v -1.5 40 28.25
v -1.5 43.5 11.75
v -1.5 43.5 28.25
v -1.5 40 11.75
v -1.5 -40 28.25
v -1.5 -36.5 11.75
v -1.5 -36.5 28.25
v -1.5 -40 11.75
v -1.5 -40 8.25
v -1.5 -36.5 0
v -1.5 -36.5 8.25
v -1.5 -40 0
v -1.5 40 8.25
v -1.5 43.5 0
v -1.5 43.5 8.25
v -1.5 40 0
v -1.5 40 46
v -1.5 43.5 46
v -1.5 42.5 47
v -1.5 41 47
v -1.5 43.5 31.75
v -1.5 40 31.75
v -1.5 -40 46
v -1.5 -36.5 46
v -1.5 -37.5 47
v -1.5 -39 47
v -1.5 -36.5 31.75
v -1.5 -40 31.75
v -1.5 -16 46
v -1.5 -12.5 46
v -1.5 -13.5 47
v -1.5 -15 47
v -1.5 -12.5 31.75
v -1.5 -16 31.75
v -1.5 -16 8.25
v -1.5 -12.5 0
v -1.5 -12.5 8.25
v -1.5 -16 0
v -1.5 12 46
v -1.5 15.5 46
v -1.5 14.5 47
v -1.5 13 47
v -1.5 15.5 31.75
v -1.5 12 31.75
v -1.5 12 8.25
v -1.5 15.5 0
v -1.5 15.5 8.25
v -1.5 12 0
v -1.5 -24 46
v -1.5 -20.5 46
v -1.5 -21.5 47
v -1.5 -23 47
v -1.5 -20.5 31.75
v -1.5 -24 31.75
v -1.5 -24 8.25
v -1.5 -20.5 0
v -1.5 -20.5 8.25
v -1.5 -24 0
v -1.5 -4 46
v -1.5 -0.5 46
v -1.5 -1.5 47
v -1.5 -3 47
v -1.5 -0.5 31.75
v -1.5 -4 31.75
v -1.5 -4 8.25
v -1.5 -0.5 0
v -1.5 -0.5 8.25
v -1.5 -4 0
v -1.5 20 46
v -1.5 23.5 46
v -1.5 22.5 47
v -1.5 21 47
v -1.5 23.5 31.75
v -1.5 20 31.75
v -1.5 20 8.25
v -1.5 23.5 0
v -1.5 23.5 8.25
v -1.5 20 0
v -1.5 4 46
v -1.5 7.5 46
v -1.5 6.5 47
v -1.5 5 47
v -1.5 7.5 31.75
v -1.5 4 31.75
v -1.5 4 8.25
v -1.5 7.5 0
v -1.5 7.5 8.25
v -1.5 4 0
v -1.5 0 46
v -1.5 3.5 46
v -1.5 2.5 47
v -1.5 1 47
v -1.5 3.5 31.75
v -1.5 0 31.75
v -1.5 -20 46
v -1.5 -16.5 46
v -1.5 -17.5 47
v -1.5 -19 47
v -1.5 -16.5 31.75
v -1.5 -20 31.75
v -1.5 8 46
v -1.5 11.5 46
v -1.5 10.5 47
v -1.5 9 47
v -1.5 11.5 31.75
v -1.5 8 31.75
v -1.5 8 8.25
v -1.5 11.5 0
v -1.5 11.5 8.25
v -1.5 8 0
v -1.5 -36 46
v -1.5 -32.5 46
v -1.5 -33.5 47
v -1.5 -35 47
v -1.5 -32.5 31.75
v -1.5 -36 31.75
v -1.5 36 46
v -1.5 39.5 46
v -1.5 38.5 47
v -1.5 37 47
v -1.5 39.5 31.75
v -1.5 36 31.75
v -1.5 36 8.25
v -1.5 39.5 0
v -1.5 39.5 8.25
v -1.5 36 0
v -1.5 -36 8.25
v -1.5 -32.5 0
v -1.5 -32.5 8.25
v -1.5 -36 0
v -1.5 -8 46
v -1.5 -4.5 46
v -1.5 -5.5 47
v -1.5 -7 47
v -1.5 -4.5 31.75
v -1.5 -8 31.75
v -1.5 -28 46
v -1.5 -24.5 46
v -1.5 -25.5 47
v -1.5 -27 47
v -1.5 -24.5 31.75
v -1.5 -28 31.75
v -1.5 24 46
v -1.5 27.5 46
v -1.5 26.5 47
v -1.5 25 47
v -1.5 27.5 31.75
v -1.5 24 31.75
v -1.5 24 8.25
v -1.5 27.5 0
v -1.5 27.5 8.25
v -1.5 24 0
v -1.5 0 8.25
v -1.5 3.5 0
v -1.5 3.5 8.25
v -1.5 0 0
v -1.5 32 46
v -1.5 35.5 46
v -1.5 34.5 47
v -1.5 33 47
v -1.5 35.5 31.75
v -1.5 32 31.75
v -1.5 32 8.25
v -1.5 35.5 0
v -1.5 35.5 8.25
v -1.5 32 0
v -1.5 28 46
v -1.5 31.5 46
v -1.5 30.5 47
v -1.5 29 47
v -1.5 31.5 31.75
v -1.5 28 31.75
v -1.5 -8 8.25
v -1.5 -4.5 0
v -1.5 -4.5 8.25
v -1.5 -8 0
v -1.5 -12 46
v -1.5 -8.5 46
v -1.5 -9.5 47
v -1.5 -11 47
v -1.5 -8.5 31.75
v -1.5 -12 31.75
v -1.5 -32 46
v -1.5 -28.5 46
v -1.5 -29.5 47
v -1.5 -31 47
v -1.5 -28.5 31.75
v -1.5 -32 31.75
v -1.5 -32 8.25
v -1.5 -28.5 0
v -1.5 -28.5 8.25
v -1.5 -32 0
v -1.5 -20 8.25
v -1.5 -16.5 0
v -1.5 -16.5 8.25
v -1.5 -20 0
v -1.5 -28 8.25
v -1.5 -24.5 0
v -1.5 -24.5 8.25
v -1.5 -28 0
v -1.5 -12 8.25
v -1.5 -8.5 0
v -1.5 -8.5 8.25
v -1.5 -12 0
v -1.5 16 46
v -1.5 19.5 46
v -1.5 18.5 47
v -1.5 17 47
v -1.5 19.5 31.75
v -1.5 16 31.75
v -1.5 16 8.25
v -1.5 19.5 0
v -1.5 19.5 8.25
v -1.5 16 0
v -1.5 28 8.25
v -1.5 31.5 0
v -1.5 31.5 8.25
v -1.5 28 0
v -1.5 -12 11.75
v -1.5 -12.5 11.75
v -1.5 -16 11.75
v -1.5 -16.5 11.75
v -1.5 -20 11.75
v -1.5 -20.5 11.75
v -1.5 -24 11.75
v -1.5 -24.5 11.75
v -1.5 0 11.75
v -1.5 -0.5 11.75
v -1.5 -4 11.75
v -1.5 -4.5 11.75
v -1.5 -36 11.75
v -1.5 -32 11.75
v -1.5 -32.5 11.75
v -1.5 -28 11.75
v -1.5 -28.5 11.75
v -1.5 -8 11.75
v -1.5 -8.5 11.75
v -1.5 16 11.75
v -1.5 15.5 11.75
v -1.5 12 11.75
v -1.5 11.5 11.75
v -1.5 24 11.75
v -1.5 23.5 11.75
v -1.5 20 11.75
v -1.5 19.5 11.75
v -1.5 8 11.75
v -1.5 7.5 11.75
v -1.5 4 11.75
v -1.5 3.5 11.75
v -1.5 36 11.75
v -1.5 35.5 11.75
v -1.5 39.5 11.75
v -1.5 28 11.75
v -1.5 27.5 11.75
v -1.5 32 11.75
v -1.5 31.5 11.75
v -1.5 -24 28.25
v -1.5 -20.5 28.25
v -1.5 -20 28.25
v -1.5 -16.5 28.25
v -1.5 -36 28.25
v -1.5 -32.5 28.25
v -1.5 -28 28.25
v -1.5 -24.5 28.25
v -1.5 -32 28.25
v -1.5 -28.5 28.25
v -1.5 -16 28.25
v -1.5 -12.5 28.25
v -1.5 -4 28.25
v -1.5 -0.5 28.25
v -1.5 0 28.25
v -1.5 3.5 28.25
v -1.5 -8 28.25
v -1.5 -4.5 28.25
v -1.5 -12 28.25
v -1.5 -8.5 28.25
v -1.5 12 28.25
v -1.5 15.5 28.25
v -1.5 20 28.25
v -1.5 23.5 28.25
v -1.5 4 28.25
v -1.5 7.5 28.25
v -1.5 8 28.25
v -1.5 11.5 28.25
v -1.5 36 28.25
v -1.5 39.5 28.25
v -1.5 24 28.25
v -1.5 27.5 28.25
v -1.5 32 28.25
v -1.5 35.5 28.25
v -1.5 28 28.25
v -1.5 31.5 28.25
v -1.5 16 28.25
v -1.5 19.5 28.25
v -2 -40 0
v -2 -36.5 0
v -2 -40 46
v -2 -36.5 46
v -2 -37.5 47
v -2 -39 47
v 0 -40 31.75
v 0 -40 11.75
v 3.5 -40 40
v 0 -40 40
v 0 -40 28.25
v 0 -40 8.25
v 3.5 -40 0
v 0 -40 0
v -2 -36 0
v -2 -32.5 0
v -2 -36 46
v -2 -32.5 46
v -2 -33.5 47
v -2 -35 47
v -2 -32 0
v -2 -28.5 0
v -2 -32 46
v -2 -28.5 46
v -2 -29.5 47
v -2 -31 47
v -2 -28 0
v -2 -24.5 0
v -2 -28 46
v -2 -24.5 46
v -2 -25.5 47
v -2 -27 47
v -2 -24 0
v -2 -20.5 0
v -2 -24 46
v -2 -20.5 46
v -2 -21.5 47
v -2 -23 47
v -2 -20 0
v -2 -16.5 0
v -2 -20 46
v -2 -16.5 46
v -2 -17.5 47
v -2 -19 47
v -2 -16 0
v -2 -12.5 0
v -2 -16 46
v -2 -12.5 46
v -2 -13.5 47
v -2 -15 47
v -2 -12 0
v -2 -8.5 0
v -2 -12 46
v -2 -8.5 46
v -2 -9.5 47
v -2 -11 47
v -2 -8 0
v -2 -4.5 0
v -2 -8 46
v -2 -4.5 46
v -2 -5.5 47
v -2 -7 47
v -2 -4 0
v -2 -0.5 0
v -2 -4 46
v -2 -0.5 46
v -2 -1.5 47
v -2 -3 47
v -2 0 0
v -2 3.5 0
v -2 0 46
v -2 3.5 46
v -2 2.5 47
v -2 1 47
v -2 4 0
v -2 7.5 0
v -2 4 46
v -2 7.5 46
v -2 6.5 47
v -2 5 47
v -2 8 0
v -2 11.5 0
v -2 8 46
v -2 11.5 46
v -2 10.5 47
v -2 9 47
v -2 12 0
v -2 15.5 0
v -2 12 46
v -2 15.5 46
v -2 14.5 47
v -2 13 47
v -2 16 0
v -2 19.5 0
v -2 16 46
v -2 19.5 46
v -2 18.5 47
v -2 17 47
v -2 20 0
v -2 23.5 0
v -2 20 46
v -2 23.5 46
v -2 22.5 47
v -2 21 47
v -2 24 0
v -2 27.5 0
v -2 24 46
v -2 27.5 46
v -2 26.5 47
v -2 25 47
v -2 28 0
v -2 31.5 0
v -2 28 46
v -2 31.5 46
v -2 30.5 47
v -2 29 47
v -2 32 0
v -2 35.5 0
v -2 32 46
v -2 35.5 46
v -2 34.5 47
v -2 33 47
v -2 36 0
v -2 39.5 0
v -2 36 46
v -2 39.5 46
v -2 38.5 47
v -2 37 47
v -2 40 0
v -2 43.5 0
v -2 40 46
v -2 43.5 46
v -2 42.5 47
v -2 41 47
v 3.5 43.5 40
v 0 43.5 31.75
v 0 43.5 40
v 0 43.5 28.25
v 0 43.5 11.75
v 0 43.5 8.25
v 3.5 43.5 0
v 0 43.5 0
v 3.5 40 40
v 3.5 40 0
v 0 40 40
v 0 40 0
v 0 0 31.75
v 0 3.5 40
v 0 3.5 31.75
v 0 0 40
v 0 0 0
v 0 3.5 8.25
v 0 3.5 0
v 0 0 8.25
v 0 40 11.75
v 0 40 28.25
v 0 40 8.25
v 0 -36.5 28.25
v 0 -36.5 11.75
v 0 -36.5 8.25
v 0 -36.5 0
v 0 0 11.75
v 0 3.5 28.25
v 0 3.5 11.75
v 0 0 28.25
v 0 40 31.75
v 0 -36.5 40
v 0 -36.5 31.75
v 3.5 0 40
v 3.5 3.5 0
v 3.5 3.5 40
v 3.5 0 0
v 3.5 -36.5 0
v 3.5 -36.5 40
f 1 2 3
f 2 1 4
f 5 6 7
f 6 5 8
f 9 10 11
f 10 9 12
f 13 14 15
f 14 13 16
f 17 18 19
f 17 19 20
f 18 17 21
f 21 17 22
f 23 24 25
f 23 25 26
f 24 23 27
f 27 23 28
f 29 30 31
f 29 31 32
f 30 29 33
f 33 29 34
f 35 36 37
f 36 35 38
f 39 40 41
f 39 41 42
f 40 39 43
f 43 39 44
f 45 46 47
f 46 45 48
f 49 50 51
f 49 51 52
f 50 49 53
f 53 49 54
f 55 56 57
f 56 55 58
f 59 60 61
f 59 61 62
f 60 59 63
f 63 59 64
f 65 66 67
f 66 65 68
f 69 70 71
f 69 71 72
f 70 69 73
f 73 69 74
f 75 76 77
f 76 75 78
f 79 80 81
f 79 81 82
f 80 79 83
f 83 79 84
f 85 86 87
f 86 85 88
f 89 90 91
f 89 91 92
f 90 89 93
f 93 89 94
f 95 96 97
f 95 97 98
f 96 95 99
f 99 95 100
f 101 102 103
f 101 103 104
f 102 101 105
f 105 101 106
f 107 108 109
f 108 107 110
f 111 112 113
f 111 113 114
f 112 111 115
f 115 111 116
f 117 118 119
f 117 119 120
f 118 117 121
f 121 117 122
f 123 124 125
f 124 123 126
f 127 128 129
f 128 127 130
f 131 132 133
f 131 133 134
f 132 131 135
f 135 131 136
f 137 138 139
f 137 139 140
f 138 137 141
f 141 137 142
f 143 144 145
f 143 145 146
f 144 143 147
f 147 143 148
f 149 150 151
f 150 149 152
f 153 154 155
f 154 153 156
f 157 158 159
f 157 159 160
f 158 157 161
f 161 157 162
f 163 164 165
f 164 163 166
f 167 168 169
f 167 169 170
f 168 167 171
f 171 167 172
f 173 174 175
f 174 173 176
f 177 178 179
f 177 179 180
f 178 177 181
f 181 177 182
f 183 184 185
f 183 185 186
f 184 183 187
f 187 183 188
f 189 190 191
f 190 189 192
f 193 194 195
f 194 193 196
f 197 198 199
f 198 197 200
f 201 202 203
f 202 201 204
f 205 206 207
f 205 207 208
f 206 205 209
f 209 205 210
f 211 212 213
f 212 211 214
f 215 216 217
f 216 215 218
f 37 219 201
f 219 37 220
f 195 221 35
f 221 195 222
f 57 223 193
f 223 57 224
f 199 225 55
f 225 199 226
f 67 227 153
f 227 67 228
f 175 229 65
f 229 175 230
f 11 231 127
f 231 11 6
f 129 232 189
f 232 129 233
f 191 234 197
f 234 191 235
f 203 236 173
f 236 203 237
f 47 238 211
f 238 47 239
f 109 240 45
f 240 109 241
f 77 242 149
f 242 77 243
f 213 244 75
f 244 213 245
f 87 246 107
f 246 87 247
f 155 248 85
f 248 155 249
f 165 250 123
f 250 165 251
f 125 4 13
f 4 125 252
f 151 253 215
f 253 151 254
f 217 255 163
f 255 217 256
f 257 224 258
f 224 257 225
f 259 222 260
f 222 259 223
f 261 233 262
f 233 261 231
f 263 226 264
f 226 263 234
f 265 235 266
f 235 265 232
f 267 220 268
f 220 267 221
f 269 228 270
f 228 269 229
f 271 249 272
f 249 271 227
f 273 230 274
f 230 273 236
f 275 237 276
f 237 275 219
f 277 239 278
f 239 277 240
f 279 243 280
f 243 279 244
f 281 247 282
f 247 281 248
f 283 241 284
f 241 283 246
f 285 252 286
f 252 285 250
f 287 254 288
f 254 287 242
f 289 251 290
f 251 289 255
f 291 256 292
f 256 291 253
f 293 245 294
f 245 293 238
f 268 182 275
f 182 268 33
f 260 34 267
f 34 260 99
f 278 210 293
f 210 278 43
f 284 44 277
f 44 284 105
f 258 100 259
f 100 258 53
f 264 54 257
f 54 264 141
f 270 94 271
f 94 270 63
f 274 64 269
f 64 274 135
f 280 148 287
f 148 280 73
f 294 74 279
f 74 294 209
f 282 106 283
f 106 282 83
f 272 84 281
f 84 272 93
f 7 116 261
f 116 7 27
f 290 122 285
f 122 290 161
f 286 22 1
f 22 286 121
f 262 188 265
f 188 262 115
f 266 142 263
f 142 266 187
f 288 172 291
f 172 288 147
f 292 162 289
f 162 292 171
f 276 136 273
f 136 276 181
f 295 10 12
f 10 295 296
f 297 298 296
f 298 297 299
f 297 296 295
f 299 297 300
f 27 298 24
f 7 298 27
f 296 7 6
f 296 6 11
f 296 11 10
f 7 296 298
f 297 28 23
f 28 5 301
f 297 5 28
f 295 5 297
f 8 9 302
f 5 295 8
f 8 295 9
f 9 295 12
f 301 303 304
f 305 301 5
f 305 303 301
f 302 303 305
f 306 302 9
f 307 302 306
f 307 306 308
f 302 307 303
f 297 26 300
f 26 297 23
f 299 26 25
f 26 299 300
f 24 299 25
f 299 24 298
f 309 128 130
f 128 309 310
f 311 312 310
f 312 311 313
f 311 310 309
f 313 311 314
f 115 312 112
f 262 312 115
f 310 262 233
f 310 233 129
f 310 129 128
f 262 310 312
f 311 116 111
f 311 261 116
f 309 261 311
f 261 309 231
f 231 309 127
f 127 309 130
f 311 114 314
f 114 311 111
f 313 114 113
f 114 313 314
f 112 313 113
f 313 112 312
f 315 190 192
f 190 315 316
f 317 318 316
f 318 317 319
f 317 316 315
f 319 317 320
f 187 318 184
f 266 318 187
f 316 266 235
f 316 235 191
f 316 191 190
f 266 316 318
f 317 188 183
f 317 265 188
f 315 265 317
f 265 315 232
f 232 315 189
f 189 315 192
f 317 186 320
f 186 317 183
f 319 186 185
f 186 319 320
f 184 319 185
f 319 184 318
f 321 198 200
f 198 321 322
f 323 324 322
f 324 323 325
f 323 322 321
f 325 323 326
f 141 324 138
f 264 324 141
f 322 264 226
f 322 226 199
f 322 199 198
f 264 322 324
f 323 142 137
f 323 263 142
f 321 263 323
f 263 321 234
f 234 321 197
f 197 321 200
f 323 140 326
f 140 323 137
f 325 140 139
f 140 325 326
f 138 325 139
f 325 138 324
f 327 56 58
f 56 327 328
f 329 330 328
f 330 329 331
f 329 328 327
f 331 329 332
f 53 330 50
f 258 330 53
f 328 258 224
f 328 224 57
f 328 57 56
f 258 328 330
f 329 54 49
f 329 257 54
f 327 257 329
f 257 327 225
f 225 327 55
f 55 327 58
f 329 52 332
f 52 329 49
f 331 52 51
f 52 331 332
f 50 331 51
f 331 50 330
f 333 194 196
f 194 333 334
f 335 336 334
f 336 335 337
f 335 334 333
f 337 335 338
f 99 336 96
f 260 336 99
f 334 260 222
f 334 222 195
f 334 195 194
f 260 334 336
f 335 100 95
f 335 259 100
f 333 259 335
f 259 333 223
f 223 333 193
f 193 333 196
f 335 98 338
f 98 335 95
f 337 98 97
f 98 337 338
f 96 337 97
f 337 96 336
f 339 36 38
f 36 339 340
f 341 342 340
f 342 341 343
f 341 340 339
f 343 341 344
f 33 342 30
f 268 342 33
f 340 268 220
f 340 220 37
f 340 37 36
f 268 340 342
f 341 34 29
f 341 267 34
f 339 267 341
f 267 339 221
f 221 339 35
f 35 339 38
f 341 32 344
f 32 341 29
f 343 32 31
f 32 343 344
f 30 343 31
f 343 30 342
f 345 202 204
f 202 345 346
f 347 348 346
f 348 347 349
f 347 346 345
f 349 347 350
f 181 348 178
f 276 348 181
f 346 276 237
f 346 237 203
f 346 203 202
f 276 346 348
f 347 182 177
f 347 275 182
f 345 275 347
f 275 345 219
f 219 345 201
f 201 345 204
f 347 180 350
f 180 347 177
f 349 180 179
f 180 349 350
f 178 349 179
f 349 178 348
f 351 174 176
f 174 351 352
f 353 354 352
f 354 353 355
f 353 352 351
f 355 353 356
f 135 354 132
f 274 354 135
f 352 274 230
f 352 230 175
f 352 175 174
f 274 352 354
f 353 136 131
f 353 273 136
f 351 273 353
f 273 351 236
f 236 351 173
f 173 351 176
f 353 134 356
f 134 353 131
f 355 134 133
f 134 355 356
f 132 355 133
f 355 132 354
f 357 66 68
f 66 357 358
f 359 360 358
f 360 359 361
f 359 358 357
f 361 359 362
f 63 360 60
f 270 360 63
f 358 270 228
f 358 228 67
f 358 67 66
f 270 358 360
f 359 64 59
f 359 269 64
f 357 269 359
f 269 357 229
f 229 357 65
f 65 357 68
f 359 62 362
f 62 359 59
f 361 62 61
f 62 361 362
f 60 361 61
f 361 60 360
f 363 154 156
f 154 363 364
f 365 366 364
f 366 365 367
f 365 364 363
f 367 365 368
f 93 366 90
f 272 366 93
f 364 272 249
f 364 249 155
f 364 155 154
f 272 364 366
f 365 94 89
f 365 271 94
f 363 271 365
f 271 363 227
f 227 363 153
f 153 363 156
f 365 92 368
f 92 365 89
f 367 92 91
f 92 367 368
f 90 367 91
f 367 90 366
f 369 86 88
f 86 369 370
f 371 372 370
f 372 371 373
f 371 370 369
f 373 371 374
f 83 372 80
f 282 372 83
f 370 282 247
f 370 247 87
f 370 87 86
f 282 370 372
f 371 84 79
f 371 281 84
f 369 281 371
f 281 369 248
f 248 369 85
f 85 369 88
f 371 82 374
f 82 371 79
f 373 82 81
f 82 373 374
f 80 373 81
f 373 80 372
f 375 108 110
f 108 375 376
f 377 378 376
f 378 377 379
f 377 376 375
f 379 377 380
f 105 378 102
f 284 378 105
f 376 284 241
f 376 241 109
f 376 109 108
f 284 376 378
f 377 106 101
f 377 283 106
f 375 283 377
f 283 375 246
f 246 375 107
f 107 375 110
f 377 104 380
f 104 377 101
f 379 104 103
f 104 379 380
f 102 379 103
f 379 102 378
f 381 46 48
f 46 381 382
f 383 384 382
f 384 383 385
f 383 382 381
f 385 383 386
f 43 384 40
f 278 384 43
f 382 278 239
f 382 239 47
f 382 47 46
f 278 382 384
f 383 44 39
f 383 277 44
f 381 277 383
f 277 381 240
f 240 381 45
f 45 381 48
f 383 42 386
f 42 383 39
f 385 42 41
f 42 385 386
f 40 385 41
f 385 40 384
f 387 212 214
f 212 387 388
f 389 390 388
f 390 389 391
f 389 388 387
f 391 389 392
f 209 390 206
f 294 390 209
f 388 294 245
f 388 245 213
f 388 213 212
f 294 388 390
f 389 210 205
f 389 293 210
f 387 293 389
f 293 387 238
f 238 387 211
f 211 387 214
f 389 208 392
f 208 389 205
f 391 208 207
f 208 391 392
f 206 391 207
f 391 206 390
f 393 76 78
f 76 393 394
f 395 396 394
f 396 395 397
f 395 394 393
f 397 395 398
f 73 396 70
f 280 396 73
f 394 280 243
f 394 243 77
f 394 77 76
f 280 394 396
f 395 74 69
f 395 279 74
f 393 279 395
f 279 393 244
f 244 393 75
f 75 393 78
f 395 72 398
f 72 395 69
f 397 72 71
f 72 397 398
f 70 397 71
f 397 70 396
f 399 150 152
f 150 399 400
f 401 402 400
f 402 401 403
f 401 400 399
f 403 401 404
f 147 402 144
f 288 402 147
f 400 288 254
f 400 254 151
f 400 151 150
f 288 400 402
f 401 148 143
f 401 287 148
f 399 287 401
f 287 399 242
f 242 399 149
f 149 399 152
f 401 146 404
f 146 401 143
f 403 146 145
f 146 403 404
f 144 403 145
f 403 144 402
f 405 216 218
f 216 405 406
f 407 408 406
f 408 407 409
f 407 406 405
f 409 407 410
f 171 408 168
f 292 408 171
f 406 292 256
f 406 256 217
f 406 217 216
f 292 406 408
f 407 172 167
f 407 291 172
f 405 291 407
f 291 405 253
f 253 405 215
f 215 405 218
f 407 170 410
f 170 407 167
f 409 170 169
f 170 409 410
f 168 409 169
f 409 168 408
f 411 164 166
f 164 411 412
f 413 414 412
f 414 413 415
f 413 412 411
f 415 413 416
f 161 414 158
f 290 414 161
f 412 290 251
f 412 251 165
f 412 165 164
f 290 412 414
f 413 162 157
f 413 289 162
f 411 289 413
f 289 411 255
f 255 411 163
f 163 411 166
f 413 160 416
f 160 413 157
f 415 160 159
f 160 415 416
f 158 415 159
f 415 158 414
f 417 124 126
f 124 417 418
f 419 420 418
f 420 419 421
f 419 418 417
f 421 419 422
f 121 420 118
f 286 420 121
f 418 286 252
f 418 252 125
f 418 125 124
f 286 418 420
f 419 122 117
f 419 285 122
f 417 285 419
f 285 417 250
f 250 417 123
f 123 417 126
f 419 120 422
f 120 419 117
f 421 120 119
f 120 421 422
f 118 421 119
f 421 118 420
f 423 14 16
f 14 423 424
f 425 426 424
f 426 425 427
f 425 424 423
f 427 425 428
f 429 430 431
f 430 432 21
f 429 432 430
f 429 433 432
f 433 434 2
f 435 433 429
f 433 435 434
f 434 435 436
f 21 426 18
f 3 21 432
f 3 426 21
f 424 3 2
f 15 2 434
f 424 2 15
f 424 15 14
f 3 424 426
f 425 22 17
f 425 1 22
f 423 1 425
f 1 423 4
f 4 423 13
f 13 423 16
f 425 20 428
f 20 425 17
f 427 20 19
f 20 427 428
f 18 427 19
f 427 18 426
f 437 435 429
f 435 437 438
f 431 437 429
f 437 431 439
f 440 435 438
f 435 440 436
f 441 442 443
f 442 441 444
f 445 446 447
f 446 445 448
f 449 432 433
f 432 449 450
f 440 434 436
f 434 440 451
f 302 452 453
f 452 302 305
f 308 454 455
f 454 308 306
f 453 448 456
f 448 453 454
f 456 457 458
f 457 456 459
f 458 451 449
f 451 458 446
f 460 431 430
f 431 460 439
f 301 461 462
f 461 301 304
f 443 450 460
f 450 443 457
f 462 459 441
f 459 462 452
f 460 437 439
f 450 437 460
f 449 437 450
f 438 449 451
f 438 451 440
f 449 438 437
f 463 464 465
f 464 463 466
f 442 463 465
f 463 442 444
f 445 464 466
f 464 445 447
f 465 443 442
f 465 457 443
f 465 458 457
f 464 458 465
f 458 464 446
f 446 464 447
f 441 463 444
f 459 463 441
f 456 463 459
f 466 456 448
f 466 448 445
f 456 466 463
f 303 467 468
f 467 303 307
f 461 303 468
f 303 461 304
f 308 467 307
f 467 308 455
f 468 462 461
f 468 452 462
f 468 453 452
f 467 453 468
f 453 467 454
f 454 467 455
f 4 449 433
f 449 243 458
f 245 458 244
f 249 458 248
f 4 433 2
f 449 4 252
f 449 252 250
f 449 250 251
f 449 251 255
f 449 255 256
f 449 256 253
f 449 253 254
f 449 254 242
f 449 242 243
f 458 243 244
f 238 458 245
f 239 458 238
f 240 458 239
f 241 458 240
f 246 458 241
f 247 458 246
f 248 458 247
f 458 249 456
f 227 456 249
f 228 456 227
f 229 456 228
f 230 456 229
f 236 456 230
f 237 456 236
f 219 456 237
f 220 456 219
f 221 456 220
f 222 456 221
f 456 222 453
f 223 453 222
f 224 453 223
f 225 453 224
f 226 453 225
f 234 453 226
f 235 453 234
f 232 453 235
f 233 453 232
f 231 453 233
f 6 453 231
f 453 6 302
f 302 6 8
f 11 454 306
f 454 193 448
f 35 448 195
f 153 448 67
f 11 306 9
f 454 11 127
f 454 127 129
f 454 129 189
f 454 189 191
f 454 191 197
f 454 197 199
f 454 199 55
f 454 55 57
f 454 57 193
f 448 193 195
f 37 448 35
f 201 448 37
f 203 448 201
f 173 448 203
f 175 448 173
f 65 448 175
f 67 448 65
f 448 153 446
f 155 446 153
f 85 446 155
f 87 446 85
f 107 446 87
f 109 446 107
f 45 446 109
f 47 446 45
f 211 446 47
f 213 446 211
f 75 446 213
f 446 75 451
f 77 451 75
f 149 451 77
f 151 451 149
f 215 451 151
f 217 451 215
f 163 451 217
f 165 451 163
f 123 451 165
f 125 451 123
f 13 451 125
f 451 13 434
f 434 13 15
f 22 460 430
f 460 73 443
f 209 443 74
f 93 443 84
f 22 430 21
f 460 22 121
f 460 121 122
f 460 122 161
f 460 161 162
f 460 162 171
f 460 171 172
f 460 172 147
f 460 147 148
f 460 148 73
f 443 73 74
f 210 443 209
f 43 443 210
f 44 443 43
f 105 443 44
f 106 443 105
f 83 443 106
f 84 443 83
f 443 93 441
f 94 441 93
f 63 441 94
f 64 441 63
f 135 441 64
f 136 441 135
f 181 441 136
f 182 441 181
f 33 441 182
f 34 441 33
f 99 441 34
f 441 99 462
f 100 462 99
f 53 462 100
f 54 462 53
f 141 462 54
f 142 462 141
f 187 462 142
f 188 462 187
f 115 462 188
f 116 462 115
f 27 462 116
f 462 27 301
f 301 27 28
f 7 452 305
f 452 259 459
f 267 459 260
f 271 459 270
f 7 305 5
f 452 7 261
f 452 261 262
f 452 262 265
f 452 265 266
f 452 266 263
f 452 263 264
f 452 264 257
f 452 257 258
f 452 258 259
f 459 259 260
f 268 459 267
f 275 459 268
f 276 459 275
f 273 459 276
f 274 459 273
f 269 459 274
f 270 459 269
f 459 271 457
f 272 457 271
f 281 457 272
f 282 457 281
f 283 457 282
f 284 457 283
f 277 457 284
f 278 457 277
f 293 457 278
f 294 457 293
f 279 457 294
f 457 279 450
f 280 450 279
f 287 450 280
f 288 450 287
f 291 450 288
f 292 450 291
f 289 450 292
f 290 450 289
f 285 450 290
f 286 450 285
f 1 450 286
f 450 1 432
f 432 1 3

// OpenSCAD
//Globals
$fn=100;
Opacity=0.4;

//Posts
module Post(){color("red",Opacity)cube([3.5,3.5,40]);}
translate([0,40,0])Post();
translate([0,0,0])Post();
translate([0,-40,0])Post();

//Rails
module Rail(){color("slategray",Opacity)cube([1.5,80+3.5,3.5]);}
translate([-1.5,-40,10-1.75])Rail();
translate([-1.5,-40,30-1.75])Rail();

//Pickets
module Picket(){color("maroon",Opacity)cube([0.5,3.5,46]);}
module Tip(){color("maroon",Opacity)polyhedron( CubePoints, CubeFaces );}
for (a =[0:20]){
translate([-1.5-0.5,-40+a*4,0])Picket();  
translate([-1.5-0.5,-40+a*4,46])Tip();
}

 
CubePoints = [
  [ 0, 0, 0],  //0
  [ 0.5, 0, 0 ],  //1
  [ 0.5, 3.5, 0 ],  //2
  [ 0, 3.5, 0 ],  //3
  [ 0, 1, 1 ],  //4
  [ 0.5, 1, 1 ],  //5
  [ 0.5, 2.5, 1 ],  //6
  [ 0, 2.5, 1 ]]; //7
   
CubeFaces = [
  [0,1,2,3],  // bottom
  [4,5,1,0],  // front
  [7,6,5,4],  // top
  [5,6,2,1],  // right
  [6,7,3,2],  // back
  [7,4,0,3]]; // left
